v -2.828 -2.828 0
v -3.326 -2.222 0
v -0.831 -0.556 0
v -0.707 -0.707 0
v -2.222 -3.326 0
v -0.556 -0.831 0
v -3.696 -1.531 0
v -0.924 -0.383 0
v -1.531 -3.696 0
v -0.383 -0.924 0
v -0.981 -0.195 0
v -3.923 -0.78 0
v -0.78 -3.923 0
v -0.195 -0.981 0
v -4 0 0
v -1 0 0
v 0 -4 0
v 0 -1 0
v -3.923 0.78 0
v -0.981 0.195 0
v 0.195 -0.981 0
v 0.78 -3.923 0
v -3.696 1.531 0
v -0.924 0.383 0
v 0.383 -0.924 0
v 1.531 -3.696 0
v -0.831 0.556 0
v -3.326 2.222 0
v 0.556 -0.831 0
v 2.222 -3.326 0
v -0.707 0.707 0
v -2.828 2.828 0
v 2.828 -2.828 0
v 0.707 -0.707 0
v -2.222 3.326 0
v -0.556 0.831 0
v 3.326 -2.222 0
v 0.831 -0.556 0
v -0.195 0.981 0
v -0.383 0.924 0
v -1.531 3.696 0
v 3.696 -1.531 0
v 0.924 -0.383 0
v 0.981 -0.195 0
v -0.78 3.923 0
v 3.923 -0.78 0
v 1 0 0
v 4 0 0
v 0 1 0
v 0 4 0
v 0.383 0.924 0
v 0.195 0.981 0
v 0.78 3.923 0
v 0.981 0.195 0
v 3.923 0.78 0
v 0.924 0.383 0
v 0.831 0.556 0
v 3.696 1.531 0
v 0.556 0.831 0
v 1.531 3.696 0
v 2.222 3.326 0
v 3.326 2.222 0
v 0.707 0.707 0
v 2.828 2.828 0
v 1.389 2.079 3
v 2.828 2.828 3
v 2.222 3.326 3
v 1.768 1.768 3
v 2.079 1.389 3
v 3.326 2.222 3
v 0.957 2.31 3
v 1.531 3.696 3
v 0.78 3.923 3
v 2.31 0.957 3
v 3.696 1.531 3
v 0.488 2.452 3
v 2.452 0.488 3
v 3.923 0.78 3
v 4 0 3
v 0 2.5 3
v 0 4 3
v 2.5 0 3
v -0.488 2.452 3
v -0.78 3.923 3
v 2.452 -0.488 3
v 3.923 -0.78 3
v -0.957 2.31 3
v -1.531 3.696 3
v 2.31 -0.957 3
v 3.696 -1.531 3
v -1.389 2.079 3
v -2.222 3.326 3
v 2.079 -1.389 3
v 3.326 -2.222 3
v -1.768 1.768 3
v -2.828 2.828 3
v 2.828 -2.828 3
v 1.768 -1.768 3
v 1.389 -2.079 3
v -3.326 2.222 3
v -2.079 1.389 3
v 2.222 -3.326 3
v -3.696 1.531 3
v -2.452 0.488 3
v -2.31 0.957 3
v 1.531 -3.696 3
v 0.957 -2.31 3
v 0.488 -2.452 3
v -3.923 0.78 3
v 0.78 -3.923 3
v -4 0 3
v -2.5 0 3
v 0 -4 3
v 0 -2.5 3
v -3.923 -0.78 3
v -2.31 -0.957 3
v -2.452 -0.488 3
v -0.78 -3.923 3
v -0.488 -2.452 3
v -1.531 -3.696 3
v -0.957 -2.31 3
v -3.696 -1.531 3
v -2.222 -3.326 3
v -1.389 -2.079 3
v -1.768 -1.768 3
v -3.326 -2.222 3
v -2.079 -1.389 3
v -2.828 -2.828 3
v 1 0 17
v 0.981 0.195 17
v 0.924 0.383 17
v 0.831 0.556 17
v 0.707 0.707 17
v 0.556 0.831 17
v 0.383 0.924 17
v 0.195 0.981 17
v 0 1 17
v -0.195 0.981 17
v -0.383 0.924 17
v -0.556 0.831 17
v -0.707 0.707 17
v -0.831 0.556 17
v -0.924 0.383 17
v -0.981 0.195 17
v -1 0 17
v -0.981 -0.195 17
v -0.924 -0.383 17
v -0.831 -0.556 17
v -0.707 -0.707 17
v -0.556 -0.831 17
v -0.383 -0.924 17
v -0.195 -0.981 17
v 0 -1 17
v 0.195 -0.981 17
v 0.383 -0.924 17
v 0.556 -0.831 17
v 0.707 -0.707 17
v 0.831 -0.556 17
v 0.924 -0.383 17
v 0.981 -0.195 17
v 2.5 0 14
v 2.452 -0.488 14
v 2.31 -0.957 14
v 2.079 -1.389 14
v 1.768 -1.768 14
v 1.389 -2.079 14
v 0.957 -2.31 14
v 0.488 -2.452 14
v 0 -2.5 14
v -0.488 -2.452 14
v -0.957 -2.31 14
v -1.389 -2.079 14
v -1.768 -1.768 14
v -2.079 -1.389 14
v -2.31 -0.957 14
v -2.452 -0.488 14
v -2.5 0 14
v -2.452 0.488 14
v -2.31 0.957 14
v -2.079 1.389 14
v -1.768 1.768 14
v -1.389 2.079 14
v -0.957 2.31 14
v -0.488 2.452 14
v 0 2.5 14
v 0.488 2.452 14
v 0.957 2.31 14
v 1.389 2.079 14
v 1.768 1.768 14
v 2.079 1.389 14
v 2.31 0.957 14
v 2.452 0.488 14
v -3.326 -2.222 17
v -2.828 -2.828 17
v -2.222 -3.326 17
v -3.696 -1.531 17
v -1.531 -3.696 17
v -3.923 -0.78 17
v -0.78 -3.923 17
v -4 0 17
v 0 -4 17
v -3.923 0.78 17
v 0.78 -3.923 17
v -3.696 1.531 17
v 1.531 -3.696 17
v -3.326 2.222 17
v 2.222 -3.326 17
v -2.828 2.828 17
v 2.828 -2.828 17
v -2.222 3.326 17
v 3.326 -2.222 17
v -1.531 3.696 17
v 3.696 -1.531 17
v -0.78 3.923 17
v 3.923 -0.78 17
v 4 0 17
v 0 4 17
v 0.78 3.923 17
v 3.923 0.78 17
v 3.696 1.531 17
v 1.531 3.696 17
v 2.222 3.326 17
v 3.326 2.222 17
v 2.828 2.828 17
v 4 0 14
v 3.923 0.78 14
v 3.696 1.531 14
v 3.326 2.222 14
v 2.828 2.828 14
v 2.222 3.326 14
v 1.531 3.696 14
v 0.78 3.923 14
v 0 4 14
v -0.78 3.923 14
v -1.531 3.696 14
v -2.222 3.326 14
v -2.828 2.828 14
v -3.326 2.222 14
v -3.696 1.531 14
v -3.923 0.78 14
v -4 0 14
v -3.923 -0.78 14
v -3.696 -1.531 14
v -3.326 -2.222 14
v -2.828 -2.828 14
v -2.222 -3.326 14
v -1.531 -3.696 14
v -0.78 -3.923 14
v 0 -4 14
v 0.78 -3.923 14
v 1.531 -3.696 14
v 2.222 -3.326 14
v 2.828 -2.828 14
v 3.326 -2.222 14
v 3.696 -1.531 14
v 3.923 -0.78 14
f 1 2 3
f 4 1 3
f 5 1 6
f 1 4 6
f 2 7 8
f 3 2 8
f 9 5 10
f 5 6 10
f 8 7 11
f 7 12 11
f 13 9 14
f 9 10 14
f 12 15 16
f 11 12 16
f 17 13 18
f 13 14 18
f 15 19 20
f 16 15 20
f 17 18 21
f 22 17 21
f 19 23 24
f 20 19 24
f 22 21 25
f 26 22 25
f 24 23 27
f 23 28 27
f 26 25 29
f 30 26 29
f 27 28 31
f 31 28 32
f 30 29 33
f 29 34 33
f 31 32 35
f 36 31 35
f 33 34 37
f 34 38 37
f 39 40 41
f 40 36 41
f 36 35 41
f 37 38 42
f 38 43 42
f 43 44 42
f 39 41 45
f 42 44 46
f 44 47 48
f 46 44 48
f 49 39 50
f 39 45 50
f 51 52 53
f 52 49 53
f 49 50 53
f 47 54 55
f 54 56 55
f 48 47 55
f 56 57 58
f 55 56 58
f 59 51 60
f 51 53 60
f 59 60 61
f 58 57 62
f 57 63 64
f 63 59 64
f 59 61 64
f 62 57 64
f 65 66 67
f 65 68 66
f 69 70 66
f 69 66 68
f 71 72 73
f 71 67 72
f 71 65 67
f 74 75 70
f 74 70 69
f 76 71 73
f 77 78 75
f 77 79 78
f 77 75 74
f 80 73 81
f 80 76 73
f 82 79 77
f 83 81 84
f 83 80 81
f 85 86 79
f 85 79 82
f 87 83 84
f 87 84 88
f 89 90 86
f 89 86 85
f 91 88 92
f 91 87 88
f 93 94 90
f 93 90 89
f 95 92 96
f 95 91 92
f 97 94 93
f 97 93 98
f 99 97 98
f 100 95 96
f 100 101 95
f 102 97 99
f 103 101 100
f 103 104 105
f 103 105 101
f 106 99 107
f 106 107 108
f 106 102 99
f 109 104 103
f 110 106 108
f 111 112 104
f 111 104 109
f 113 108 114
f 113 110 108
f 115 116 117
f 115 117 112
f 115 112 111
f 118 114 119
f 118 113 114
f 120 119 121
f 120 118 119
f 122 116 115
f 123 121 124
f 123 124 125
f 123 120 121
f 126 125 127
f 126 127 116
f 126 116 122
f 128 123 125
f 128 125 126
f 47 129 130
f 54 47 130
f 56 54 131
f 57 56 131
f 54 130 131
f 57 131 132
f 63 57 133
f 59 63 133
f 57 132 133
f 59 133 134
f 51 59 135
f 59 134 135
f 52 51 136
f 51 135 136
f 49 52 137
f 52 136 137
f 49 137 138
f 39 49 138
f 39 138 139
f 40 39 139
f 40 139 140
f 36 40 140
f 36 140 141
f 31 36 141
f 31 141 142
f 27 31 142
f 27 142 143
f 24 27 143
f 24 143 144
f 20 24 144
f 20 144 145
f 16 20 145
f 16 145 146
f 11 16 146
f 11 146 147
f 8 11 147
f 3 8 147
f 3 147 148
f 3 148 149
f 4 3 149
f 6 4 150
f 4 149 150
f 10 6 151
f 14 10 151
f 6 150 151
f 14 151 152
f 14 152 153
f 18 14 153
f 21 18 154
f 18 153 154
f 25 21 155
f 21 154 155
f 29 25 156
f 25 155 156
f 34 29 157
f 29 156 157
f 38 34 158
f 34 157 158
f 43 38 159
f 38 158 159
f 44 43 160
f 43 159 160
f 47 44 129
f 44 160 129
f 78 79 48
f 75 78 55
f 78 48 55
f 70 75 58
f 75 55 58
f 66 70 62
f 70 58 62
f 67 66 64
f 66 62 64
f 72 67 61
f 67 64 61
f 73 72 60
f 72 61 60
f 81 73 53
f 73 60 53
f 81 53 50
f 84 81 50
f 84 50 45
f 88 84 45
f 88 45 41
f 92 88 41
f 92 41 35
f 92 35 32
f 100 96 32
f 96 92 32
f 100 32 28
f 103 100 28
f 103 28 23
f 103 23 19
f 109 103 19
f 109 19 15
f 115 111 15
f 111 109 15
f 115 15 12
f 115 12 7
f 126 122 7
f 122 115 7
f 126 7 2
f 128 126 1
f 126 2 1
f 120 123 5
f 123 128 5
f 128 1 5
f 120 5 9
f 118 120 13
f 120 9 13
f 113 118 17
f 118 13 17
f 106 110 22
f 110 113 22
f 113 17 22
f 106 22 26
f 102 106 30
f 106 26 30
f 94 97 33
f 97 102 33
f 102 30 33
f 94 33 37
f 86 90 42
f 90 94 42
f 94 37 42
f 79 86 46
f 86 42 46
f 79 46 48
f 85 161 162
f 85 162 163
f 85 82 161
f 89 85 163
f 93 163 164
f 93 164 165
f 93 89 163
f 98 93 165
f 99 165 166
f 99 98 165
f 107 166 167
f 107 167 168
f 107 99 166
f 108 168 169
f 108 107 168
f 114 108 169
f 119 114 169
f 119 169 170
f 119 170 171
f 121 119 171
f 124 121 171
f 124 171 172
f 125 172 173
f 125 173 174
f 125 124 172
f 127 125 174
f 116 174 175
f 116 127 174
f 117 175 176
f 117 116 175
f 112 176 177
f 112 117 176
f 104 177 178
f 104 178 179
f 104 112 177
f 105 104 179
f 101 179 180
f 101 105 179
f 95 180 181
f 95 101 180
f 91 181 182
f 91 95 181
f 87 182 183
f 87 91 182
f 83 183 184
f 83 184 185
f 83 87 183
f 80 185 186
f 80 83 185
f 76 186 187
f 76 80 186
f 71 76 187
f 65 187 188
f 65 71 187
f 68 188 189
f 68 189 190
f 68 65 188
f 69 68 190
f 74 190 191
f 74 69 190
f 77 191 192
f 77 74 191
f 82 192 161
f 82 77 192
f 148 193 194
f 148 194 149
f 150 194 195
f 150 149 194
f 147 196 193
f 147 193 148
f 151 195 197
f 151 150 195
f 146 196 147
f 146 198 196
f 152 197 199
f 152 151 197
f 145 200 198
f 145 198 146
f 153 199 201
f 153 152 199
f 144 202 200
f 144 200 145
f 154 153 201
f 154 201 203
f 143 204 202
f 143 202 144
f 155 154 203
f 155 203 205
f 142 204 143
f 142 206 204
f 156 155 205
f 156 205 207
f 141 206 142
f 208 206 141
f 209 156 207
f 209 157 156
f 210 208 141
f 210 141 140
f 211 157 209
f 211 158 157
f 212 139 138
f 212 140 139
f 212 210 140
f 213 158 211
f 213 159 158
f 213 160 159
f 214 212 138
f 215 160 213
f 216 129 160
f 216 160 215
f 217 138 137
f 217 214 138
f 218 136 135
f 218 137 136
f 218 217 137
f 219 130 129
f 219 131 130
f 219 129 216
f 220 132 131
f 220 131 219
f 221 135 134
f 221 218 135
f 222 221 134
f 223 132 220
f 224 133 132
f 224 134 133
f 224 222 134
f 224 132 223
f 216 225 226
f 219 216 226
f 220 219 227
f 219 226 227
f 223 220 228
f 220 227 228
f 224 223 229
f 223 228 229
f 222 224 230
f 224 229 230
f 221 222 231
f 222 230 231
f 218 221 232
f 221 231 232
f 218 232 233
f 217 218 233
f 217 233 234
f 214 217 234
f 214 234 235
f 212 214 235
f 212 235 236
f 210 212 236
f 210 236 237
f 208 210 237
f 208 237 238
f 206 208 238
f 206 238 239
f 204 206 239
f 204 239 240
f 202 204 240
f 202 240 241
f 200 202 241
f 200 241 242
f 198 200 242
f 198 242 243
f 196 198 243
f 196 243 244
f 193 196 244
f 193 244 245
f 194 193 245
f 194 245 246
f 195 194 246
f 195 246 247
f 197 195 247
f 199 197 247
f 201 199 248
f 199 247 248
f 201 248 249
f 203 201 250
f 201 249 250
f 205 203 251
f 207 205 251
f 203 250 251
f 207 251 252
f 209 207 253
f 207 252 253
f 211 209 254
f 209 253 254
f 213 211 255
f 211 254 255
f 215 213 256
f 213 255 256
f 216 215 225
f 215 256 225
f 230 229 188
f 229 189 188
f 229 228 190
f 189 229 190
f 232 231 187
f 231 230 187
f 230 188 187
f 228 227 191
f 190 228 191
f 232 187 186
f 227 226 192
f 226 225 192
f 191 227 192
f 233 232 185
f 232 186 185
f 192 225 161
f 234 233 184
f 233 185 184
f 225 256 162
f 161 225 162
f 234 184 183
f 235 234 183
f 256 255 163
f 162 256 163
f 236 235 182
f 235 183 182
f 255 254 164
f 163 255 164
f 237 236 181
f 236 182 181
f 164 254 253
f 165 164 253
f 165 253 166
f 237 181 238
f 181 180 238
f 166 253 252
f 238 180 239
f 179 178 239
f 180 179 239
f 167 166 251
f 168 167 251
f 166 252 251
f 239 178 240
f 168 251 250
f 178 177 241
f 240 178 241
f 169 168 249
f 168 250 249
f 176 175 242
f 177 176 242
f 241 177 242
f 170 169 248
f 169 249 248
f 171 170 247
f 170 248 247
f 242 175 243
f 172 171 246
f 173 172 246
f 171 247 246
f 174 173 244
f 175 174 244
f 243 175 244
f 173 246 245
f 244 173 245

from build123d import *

# Parameters (mm, degrees)
CROQUIS1_R              = 4
SALIENTE_EXTRUIR1_DEPTH = 17
CROQUIS2_R              = 1
CORTAR_EXTRUIR1_DEPTH   = 18.916472867
CROQUIS3_W              = 11
CROQUIS3_H              = 1.5


with BuildPart() as part:
    # Croquis1 → Saliente-Extruir1 (new body)
    with BuildSketch(Plane.XY):
        Circle(CROQUIS1_R)
    extrude(amount=SALIENTE_EXTRUIR1_DEPTH)

    # Croquis2 → Cortar-Extruir1 (cut, through all)
    with BuildSketch(Plane.XY.offset(17)):
        Circle(CROQUIS2_R)
    extrude(amount=-CORTAR_EXTRUIR1_DEPTH, mode=Mode.SUBTRACT)

    # Croquis3 → Cortar-Revolución1 (revolve, cut)
    with BuildSketch(Plane(origin=(0, 0, 0), x_dir=(0, 0, -1), z_dir=(1, 0, 0)), mode=Mode.PRIVATE) as cortar_revoluci_n1_sk:
        with Locations((-8.5, 3.25)):
            Rectangle(CROQUIS3_W, CROQUIS3_H)
    revolve(cortar_revoluci_n1_sk.sketch.rotate(Axis((0, 0, 17), (0, 0, -1)), 90), axis=Axis((0, 0, 17), (0, 0, -1)), mode=Mode.SUBTRACT)


solid = part.part
